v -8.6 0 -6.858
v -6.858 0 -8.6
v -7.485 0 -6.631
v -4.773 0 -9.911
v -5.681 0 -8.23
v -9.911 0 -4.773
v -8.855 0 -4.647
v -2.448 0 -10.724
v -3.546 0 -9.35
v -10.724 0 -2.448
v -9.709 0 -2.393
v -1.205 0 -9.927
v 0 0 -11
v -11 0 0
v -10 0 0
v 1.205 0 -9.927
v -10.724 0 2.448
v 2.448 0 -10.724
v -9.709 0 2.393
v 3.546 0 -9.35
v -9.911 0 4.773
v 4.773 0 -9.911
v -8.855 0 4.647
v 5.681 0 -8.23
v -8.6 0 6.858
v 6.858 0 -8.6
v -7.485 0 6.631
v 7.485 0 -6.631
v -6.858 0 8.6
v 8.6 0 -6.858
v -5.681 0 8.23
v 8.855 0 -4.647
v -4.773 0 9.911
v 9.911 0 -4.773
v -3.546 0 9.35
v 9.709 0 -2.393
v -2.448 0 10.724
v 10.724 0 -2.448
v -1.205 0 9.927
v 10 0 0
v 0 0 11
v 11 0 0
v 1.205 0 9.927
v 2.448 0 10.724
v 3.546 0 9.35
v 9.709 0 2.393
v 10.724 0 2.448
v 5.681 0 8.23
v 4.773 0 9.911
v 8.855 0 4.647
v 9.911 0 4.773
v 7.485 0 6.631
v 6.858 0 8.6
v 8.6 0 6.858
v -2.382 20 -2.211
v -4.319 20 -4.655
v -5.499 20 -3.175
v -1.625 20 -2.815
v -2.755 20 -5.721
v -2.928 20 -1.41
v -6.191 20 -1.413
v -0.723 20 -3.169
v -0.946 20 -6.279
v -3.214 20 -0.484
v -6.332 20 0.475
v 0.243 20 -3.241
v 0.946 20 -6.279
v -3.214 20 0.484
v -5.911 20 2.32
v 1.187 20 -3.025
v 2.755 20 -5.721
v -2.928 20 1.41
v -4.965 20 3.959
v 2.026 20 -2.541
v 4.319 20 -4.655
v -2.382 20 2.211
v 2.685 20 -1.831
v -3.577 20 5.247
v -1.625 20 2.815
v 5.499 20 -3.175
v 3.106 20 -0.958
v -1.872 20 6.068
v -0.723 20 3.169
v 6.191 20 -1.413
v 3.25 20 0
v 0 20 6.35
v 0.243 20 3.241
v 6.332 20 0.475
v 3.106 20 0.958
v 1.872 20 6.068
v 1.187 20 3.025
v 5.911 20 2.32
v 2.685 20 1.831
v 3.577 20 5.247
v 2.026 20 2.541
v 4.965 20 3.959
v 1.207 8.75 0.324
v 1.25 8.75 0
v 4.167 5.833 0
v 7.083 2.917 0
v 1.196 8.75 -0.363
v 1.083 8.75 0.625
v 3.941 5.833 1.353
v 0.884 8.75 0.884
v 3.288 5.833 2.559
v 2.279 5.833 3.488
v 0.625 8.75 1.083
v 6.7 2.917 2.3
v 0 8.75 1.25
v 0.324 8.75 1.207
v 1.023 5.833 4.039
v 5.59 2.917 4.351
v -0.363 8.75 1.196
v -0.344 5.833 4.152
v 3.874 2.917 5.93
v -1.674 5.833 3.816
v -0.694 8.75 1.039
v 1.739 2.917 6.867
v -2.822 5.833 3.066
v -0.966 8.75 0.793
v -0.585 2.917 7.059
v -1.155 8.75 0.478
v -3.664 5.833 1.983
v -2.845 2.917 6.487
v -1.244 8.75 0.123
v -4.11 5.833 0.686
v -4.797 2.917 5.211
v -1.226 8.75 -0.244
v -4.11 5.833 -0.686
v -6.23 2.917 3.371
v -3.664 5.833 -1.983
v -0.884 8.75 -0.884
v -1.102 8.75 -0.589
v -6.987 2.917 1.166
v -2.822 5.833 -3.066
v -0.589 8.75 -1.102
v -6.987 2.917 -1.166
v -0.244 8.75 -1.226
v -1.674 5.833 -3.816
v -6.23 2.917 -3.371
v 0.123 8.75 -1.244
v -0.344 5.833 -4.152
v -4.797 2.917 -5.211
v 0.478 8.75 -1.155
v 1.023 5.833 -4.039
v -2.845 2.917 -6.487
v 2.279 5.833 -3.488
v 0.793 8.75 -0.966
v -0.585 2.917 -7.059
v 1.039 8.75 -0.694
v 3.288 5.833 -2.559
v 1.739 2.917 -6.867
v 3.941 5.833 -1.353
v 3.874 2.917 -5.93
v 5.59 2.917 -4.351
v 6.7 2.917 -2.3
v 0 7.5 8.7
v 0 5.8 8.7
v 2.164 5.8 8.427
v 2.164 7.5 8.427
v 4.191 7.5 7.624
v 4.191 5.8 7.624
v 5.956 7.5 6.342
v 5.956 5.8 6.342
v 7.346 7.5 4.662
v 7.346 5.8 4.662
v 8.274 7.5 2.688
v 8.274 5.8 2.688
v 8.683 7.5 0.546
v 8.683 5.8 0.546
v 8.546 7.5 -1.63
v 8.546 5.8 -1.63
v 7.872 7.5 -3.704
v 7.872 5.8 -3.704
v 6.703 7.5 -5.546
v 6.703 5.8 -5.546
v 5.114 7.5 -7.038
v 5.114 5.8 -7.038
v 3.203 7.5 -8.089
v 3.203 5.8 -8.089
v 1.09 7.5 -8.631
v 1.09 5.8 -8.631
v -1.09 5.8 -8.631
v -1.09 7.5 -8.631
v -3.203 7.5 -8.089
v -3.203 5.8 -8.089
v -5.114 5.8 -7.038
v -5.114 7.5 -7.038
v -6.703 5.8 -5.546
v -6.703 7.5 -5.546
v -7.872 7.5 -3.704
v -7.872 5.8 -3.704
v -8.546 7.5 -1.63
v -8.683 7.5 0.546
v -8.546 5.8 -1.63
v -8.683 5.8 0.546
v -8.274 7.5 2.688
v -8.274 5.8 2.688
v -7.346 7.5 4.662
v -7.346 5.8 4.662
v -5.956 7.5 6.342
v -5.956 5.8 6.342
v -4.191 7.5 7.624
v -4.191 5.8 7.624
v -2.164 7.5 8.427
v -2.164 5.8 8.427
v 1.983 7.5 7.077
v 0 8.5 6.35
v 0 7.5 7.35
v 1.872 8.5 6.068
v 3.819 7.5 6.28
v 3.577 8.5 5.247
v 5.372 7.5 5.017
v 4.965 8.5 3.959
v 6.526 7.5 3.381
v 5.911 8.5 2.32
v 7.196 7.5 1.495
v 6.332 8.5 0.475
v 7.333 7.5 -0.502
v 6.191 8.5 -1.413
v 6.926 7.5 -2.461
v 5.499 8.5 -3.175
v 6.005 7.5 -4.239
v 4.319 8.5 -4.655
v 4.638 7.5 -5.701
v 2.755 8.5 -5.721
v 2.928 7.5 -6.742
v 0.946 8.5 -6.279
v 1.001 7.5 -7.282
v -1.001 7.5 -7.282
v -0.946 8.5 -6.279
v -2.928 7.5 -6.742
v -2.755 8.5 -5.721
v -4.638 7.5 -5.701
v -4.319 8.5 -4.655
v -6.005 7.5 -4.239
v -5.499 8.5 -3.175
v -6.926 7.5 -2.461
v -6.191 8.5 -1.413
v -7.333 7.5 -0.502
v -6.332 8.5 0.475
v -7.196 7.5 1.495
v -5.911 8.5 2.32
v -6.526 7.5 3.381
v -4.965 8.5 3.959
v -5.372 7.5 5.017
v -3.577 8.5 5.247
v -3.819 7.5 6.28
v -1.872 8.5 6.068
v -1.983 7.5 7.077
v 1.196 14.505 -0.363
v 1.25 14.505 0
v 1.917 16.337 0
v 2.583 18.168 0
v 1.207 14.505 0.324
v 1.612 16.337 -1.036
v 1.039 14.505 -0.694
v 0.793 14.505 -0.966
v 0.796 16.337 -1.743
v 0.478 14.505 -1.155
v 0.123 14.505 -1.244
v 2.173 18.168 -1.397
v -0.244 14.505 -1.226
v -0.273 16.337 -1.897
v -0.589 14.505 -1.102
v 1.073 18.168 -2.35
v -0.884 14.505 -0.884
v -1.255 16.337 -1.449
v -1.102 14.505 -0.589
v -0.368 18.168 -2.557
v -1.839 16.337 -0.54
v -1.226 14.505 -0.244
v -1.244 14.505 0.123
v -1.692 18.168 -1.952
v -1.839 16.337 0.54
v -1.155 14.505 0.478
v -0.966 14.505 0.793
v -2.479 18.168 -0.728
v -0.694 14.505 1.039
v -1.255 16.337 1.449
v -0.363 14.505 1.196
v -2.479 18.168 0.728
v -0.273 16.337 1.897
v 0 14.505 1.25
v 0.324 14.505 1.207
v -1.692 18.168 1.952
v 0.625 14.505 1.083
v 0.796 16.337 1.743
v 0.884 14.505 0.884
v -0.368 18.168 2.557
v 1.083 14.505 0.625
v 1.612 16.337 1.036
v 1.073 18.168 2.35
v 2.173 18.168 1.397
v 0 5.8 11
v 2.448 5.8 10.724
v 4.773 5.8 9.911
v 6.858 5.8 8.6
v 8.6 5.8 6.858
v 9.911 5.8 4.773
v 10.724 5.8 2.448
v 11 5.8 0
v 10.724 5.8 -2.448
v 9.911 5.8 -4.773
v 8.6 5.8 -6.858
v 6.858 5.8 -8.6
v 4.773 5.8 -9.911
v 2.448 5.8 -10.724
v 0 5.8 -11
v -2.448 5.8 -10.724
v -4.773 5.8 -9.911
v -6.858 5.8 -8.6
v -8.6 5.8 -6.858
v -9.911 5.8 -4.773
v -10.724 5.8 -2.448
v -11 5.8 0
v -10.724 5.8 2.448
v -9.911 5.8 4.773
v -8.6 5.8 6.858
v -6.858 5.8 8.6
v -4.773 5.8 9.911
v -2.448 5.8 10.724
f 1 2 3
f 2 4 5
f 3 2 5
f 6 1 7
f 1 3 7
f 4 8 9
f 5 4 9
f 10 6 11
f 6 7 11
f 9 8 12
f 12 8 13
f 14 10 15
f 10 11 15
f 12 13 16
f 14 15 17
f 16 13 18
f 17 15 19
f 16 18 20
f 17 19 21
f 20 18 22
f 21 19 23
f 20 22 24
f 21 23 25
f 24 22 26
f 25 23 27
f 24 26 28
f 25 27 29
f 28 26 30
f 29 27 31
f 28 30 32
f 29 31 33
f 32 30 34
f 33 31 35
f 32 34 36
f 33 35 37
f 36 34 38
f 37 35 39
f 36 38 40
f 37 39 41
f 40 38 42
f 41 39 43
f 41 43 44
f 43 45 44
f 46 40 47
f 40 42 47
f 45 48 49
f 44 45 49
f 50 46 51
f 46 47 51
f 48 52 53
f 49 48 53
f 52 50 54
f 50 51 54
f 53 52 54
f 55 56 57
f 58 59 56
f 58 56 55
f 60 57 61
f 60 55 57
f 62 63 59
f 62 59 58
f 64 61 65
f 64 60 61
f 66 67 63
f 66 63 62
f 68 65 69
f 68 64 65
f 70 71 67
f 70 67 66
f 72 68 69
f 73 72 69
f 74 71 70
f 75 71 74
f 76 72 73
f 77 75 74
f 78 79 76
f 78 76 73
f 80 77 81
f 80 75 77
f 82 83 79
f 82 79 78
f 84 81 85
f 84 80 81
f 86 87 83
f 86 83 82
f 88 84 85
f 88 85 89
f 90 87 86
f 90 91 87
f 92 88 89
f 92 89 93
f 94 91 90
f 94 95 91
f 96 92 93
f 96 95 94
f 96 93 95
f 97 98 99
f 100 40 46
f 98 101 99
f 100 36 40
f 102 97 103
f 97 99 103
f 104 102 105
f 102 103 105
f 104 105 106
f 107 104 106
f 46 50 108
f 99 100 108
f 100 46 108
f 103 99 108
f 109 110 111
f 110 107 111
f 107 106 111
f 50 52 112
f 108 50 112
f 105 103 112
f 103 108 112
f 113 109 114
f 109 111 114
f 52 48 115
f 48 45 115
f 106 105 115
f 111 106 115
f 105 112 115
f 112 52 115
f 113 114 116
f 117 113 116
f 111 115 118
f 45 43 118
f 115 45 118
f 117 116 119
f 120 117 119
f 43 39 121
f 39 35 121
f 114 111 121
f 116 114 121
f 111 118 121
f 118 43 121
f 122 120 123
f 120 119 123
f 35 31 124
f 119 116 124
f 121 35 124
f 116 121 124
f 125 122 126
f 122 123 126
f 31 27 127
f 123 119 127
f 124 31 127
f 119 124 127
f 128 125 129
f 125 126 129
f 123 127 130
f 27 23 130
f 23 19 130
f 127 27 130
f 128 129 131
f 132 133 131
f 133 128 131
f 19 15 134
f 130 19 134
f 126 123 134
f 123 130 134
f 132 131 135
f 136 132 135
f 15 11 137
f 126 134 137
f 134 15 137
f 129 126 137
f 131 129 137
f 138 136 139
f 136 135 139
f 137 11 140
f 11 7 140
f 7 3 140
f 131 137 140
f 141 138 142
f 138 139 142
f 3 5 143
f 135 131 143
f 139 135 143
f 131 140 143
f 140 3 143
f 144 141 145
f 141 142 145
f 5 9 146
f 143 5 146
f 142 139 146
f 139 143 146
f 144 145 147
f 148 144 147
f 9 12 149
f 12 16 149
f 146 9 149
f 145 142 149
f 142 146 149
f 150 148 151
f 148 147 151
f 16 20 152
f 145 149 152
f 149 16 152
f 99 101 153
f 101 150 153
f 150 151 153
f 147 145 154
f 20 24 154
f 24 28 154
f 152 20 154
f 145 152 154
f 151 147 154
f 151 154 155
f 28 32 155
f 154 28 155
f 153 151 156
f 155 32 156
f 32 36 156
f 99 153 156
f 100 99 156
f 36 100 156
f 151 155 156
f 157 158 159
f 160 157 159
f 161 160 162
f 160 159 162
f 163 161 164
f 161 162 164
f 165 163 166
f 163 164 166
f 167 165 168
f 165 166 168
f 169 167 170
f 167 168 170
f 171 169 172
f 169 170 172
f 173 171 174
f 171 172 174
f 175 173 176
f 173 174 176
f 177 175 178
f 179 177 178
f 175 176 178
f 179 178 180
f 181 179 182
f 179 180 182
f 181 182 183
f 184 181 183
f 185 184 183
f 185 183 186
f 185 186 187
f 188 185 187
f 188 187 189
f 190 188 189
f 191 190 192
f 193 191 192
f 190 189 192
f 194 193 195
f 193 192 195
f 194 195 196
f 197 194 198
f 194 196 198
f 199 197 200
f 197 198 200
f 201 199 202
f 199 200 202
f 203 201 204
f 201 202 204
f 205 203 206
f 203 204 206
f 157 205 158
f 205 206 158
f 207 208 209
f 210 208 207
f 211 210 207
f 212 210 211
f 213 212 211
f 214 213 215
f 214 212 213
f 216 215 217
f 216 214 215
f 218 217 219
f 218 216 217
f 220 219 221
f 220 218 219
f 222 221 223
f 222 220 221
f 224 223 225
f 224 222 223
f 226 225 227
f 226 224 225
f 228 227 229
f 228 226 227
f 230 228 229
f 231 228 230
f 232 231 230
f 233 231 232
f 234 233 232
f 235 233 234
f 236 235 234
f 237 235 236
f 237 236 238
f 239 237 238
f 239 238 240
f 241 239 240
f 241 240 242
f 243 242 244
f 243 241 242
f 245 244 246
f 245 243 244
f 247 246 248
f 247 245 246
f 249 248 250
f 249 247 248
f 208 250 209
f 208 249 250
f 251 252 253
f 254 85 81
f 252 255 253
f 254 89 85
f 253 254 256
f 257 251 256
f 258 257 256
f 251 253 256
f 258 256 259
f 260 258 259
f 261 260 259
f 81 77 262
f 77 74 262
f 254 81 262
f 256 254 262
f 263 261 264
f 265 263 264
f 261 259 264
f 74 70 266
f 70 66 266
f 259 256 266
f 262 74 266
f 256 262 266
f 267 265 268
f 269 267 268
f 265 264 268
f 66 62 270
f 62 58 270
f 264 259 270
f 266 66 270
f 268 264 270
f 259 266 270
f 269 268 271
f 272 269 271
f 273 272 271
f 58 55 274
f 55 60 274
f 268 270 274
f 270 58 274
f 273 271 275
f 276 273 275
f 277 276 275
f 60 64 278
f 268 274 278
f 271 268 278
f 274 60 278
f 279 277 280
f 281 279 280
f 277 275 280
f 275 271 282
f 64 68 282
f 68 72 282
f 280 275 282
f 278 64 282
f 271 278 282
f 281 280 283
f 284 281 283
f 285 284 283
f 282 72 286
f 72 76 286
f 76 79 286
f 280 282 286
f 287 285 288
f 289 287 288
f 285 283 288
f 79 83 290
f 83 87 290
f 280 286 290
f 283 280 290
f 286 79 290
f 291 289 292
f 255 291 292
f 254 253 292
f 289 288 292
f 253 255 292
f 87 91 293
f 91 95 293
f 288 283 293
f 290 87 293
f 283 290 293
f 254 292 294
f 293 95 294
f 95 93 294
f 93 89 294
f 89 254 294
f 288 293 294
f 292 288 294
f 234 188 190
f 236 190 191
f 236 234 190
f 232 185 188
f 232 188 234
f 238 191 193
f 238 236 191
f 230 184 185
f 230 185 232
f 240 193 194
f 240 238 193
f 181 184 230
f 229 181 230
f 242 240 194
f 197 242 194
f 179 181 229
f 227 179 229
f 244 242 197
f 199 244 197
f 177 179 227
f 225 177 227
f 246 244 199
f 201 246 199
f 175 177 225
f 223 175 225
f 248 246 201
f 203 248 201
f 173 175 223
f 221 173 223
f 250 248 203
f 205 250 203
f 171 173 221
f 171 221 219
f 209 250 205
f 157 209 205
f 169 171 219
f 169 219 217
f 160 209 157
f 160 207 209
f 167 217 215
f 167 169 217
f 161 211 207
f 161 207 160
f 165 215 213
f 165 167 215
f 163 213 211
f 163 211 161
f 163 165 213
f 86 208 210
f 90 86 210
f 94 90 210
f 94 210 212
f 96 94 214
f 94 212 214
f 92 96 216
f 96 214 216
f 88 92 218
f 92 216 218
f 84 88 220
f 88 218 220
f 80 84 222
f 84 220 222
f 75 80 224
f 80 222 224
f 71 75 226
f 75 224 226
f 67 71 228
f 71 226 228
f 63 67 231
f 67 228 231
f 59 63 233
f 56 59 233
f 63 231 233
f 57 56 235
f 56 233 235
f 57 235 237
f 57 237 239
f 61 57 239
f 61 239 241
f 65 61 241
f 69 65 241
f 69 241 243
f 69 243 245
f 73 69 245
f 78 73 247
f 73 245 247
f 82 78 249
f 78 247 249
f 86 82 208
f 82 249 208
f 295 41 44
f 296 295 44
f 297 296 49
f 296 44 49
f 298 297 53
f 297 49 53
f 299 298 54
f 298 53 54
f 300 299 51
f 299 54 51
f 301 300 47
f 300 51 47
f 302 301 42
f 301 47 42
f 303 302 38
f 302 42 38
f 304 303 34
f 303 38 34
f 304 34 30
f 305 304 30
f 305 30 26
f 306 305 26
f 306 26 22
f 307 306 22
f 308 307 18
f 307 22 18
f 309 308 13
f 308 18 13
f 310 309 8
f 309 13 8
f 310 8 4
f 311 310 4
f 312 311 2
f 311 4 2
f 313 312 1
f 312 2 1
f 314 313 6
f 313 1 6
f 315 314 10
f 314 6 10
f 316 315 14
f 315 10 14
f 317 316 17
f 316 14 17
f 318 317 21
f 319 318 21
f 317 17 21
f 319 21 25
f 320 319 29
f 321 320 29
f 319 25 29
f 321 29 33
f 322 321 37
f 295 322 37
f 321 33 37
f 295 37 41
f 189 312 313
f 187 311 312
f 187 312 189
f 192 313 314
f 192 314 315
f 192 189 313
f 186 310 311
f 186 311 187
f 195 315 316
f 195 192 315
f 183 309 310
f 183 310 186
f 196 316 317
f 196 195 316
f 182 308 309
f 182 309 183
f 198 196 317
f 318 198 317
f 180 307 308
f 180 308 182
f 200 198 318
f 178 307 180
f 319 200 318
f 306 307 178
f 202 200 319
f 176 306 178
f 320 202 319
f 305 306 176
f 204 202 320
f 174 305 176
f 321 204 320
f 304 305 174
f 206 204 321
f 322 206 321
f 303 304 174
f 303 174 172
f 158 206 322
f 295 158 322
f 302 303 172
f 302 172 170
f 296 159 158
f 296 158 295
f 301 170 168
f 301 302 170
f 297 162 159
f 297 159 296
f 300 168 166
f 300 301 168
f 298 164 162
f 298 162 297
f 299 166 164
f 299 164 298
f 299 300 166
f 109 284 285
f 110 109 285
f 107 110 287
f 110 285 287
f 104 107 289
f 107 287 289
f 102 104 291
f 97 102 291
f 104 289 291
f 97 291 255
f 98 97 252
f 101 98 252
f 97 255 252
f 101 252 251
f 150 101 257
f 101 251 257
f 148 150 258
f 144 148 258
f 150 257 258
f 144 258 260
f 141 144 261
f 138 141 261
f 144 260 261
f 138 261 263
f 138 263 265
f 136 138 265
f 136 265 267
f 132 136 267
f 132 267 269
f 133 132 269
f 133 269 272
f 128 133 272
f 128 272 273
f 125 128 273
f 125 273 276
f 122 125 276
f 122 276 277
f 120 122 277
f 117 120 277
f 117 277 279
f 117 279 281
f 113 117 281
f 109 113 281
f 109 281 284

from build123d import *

# Parameters (mm, degrees)
SKETCH1_R           = 11
BOSS_EXTRUDE1_DEPTH = 5.8
SKETCH2_R           = 8.7
BOSS_EXTRUDE2_DEPTH = 1.7
SKETCH3_R           = 6.35
BOSS_EXTRUDE3_DEPTH = 12.5
CHAMFER1_SIZE       = 1
SKETCH4_R           = 1.25
CUT_EXTRUDE1_DEPTH  = 26.337718919
SKETCH5_R           = 3.25
CUT_EXTRUDE2_DEPTH  = 8
CUT_EXTRUDE2_DRAFT  = -20
SKETCH6_R           = 10
CUT_EXTRUDE3_DEPTH  = 9
CUT_EXTRUDE3_DRAFT  = -45


with BuildPart() as part:
    # Sketch1 → Boss-Extrude1 (new body)
    with BuildSketch(Plane(origin=(0, 0, 0), x_dir=(1, 0, 0), z_dir=(0, 1, 0))):
        with Locations(Location((0, 0, 0), (0, 0, 270))):
            Circle(SKETCH1_R)
    extrude(amount=BOSS_EXTRUDE1_DEPTH)

    # Sketch2 → Boss-Extrude2 (add)
    with BuildSketch(Plane(origin=(0, 5.8, 0), x_dir=(1, 0, 0), z_dir=(0, 1, 0))):
        with Locations(Location((0, 0, 0), (0, 0, 270))):
            Circle(SKETCH2_R)
    extrude(amount=BOSS_EXTRUDE2_DEPTH)

    # Sketch3 → Boss-Extrude3 (add)
    with BuildSketch(Plane(origin=(0, 7.5, 0), x_dir=(1, 0, 0), z_dir=(0, 1, 0))):
        with Locations(Location((0, 0, 0), (0, 0, 270))):
            Circle(SKETCH3_R)
    extrude(amount=BOSS_EXTRUDE3_DEPTH)

    # Chamfer1
    chamfer1_edges = [part.edges().sort_by_distance(p)[0] for p in [
        (0, 7.5, -6.35),
    ]]
    chamfer(chamfer1_edges, length=CHAMFER1_SIZE)

    # Sketch4 → Cut-Extrude1 (cut, through all)
    with BuildSketch(Plane(origin=(0, 20, 0), x_dir=(1, 0, 0), z_dir=(0, 1, 0))):
        with Locations(Location((0, 0, 0), (0, 0, 270))):
            Circle(SKETCH4_R)
    extrude(amount=-CUT_EXTRUDE1_DEPTH, mode=Mode.SUBTRACT)


with BuildPart() as cut_extrude2_tool:
    # Sketch5 → Cut-Extrude2 (with draft: the straight prism first)
    with BuildSketch(Plane(origin=(0, 20, 0), x_dir=(1, 0, 0), z_dir=(0, 1, 0))):
        Circle(SKETCH5_R)
    extrude(amount=-CUT_EXTRUDE2_DEPTH)
    # Cut-Extrude2: the draft: its side faces are tilted about the plane it starts from
    cut_extrude2_sides = [cut_extrude2_tool.faces().sort_by_distance(p)[0] for p in [
        (-3.25, 16, 0),
    ]]
    draft(cut_extrude2_sides, Plane(origin=(0, 20, 0), x_dir=(1, 0, 0), z_dir=(0, 1, 0)), CUT_EXTRUDE2_DRAFT)


with BuildPart() as part_1:
    add(part.part)

    # Cut-Extrude2: cut by cut_extrude2_tool
    add(cut_extrude2_tool.part, mode=Mode.SUBTRACT)


with BuildPart() as cut_extrude3_tool:
    # Sketch6 → Cut-Extrude3 (with draft: the straight prism first)
    with BuildSketch(Plane.XZ):
        Circle(SKETCH6_R)
    extrude(amount=-CUT_EXTRUDE3_DEPTH)
    # Cut-Extrude3: the draft: its side faces are tilted about the plane it starts from
    cut_extrude3_sides = [cut_extrude3_tool.faces().sort_by_distance(p)[0] for p in [
        (-10, 4.5, 0),
    ]]
    draft(cut_extrude3_sides, Plane.XZ, CUT_EXTRUDE3_DRAFT)


with BuildPart() as part_2:
    add(part_1.part)

    # Cut-Extrude3: cut by cut_extrude3_tool
    add(cut_extrude3_tool.part, mode=Mode.SUBTRACT)


solid = part_2.part
